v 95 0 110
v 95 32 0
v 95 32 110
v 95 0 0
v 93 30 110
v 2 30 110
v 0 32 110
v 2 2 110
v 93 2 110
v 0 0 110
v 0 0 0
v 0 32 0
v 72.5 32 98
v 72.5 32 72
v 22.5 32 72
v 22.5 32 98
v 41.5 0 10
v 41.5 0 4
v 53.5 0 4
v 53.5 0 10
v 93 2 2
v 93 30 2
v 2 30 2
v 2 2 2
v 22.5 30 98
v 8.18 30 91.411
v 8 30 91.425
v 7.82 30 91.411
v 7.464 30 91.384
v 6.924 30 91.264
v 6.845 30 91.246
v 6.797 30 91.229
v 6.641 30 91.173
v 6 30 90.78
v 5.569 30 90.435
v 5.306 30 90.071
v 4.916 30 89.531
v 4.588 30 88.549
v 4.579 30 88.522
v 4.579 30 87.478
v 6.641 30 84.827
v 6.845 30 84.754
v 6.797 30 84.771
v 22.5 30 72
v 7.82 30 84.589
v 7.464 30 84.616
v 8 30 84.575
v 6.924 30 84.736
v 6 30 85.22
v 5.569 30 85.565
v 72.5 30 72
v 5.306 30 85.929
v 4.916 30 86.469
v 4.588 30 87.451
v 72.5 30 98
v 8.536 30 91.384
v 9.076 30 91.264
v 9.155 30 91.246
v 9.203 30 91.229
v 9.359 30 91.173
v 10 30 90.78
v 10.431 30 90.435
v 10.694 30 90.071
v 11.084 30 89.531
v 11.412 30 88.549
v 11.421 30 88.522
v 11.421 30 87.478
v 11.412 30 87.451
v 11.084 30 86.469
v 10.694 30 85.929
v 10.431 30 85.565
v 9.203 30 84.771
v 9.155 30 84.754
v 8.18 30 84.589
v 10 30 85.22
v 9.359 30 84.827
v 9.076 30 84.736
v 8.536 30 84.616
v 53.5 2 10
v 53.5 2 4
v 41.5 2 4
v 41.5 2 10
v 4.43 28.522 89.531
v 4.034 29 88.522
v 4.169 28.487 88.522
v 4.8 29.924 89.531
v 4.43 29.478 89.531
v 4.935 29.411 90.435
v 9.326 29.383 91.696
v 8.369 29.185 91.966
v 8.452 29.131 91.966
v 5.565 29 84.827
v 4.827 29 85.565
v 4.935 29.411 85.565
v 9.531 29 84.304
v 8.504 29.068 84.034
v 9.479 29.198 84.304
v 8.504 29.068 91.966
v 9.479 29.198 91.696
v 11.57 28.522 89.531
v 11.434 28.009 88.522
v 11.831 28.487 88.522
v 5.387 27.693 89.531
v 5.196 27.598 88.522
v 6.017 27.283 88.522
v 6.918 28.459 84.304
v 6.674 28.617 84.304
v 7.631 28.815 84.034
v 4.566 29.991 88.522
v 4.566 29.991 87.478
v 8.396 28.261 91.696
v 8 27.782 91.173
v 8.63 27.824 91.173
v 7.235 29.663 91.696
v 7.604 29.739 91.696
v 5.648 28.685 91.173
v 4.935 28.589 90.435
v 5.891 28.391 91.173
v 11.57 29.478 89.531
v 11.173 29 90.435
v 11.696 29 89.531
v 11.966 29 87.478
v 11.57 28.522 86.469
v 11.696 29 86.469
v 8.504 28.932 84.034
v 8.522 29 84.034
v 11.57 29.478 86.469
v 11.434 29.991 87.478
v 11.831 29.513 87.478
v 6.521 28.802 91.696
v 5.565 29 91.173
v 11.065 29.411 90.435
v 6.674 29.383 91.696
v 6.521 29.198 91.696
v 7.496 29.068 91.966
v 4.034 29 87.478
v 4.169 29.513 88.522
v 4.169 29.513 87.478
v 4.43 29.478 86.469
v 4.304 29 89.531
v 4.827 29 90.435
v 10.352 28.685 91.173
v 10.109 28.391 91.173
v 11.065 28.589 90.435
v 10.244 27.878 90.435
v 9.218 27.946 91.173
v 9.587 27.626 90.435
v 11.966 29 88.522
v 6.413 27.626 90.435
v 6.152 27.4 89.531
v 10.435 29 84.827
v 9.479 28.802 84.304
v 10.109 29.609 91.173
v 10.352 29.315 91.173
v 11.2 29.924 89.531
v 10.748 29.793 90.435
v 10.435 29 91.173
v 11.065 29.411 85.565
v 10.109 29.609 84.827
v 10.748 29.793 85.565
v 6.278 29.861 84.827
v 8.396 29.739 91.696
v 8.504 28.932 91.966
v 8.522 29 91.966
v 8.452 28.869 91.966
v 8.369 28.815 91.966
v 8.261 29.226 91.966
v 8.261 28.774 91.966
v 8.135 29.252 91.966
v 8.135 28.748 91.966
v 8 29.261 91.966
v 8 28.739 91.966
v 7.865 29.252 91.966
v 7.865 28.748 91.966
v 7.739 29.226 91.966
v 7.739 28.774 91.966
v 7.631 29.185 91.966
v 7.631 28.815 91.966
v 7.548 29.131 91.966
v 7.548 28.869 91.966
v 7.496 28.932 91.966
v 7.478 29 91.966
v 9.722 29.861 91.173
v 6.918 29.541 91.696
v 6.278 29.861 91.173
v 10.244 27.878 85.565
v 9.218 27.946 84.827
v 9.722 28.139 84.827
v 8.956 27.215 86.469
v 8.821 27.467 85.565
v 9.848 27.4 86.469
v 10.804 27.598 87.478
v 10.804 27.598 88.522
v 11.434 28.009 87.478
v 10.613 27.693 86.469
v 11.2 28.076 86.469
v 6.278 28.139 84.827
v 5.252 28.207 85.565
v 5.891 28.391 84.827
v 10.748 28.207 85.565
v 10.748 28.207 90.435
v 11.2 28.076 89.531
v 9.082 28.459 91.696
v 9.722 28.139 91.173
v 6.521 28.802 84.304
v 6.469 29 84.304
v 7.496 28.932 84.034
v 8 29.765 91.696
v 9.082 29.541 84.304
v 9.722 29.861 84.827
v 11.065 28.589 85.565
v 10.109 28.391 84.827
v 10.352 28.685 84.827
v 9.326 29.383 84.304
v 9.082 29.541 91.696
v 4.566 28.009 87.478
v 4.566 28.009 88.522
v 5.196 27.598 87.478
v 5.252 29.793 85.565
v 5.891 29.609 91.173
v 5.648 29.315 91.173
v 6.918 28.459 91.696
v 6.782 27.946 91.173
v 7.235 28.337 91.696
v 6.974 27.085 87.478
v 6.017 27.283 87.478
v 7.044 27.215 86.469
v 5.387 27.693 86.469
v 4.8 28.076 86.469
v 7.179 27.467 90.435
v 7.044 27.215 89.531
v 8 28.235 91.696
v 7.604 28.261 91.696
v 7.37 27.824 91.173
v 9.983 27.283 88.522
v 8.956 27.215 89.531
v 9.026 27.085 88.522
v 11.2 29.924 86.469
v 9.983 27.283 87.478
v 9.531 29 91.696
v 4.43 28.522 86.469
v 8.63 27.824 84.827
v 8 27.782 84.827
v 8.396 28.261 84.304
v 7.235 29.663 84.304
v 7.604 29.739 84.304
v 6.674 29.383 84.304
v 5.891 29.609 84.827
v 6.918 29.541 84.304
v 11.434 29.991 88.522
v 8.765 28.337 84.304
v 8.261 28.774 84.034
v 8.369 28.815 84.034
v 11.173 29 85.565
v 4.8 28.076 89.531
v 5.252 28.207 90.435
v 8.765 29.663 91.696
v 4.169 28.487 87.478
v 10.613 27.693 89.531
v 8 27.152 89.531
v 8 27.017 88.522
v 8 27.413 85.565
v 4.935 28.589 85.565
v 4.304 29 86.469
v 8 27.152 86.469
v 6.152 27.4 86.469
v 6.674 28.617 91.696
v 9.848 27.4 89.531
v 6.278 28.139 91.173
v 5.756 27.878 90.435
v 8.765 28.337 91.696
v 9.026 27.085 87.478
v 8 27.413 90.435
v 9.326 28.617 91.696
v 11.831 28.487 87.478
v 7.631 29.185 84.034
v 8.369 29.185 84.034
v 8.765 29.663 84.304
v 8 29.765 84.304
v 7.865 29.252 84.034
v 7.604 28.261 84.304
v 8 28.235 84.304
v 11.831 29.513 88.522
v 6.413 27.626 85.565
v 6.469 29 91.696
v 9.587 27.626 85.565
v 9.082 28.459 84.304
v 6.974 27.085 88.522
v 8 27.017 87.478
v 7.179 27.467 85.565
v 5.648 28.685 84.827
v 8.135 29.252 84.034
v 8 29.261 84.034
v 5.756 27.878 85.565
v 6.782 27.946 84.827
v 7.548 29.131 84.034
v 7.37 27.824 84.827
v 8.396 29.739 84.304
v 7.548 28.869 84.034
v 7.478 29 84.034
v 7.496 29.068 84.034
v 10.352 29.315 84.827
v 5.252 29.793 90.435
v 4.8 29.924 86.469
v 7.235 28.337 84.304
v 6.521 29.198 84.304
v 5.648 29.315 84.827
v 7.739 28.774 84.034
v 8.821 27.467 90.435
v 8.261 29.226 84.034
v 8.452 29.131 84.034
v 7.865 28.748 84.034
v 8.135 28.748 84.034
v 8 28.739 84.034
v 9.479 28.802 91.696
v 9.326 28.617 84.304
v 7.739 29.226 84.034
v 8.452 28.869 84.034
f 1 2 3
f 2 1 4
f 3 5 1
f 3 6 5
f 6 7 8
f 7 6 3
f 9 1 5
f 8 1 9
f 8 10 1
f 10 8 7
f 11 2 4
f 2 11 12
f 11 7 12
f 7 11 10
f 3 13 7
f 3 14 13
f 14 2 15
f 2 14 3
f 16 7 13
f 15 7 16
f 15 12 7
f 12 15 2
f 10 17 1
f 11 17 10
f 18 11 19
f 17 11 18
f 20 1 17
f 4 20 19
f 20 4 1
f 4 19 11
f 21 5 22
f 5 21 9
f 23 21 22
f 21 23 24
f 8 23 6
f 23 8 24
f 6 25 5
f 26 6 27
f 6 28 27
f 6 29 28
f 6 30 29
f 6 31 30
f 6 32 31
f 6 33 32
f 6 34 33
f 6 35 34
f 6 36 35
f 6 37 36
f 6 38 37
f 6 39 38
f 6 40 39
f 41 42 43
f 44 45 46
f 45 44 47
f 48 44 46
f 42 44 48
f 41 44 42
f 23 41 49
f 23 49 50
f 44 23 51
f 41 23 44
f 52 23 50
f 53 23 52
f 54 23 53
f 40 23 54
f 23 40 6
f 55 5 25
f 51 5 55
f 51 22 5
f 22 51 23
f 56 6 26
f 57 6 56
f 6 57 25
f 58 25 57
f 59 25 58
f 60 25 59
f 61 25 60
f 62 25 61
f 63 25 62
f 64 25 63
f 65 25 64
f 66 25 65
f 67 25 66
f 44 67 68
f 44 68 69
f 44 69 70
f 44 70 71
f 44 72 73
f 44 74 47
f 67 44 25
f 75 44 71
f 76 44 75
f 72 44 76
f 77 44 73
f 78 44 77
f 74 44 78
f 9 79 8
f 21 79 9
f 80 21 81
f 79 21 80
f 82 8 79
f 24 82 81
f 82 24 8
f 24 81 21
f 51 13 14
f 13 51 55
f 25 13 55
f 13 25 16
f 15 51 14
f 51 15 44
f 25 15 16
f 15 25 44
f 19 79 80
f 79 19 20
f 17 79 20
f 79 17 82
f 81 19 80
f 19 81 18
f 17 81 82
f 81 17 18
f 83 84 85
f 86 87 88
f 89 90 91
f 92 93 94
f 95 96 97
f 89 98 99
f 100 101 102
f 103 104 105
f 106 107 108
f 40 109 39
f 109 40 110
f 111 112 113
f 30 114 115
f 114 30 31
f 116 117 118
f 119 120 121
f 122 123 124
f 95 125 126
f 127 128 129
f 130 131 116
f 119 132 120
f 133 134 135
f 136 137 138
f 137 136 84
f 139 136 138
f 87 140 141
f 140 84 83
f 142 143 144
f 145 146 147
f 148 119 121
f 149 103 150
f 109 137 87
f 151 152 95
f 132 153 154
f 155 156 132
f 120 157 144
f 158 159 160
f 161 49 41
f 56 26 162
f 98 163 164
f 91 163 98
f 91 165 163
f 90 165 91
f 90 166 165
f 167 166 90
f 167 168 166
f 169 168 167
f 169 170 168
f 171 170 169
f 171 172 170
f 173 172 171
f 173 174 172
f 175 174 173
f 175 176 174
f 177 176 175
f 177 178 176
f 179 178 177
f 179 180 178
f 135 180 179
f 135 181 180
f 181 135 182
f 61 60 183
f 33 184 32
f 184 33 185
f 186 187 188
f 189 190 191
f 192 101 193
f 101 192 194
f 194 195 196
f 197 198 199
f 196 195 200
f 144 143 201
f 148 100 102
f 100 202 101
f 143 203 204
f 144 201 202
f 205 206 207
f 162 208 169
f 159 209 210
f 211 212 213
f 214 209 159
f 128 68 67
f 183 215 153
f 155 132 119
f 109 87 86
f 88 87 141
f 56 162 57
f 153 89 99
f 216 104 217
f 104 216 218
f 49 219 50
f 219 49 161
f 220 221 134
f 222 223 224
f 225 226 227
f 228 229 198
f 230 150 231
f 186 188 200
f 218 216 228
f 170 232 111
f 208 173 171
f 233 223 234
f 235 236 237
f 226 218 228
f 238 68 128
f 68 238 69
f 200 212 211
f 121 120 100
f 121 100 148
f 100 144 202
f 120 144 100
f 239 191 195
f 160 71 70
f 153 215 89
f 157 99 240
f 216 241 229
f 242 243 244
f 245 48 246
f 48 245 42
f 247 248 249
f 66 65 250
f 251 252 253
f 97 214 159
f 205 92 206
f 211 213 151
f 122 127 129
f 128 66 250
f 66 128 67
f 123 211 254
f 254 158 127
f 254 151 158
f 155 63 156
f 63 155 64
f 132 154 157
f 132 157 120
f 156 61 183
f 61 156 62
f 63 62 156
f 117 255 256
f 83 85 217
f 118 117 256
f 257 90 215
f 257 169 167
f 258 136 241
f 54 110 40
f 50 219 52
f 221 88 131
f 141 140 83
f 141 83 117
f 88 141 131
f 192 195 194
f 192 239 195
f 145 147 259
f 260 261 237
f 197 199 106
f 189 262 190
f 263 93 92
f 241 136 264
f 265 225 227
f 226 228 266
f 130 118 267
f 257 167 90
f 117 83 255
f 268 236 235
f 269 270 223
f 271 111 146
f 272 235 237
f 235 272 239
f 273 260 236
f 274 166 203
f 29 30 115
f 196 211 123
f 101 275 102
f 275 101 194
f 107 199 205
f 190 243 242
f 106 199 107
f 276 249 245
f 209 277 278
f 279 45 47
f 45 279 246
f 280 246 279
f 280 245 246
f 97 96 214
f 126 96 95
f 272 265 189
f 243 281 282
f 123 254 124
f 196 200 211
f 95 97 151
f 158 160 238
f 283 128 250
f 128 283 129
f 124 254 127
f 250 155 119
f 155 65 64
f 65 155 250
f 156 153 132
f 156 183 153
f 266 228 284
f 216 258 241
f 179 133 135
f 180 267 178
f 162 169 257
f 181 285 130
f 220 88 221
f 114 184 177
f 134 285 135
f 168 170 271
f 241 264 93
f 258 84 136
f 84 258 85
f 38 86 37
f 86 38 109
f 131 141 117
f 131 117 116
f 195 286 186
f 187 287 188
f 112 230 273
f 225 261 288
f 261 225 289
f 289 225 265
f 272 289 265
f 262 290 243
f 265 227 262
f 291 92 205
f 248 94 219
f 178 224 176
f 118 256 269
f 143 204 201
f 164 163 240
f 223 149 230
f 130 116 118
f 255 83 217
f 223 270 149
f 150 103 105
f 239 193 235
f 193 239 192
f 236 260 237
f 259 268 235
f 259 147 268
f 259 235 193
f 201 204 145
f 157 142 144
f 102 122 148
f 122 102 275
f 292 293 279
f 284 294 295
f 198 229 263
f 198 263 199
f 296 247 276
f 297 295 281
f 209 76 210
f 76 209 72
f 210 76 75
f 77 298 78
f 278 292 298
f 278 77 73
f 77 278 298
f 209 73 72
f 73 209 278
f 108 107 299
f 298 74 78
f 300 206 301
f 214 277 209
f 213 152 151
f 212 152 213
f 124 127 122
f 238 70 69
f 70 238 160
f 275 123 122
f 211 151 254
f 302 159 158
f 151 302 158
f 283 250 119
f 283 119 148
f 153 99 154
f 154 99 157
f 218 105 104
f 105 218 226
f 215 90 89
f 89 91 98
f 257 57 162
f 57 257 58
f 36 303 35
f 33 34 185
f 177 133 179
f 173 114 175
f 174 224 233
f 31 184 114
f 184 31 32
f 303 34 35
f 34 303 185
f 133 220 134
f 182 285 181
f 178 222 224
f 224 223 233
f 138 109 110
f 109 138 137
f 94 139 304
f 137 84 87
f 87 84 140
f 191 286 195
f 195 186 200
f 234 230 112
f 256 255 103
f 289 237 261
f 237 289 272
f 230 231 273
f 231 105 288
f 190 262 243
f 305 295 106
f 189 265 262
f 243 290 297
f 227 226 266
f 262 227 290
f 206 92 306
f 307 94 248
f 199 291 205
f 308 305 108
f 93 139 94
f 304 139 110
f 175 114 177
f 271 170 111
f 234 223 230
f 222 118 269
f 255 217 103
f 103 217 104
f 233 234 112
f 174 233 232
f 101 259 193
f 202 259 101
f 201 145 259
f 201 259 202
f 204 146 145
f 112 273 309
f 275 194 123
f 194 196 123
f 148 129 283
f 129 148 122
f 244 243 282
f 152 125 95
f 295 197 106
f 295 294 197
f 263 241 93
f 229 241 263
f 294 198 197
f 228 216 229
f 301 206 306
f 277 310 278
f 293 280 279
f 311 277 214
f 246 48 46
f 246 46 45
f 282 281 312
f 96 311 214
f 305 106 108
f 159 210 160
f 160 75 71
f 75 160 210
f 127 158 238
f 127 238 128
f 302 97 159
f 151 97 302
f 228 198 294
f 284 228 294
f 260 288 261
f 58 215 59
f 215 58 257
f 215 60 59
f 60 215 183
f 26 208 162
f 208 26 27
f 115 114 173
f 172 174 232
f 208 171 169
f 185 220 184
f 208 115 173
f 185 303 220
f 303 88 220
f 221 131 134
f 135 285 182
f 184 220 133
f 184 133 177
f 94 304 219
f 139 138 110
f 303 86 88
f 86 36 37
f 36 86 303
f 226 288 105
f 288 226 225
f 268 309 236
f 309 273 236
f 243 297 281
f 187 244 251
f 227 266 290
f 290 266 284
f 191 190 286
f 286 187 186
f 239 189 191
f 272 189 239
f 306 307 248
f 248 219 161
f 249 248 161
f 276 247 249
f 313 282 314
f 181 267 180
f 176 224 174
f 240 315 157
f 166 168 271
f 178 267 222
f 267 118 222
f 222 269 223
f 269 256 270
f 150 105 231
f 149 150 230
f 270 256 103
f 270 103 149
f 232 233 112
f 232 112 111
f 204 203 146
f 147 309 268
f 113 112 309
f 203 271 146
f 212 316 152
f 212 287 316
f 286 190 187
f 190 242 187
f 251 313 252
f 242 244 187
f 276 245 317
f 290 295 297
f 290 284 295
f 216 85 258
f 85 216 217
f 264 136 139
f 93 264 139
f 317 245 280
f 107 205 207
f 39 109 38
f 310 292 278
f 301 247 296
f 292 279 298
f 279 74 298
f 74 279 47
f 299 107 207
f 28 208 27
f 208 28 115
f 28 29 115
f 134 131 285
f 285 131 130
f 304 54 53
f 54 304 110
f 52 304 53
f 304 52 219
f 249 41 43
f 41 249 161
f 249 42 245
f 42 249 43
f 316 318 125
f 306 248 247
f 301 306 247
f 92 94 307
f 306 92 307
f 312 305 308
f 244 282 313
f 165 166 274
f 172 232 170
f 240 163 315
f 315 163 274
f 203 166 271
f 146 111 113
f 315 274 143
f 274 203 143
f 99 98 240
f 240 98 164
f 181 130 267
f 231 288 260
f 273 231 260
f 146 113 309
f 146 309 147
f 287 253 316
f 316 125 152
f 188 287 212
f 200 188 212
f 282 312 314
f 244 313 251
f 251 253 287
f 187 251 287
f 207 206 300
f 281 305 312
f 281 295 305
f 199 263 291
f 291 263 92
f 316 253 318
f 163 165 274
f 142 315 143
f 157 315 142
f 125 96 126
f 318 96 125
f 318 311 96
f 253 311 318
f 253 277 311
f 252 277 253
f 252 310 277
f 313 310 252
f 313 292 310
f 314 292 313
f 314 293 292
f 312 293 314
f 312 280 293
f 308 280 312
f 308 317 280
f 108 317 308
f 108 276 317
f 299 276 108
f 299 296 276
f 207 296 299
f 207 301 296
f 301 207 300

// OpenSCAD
// CyberThreatGotchi — parametric enclosure preview (OpenSCAD)
// Units: mm

width  = 95;
height = 110;
depth  = 32;
wall   = 2;

display_w = 50;
display_h = 26;
display_y = 72;

difference() {
  cube([width, depth, height]);
  // Hollow cavity
  translate([wall, wall, wall])
    cube([width - 2*wall, depth - 2*wall, height - wall]);
  // Display window (front face = Z max)
  translate([(width - display_w)/2, depth - wall - 0.1, display_y])
    cube([display_w, wall + 1, display_h]);
  // USB-C slot bottom
  translate([width/2 - 6, -0.1, 4])
    cube([12, wall + 2, 6]);
}

// Cat bump left front
translate([8, depth - 3, 88])
  scale([1, 0.5, 1])
  sphere(r=4, $fn=24);
